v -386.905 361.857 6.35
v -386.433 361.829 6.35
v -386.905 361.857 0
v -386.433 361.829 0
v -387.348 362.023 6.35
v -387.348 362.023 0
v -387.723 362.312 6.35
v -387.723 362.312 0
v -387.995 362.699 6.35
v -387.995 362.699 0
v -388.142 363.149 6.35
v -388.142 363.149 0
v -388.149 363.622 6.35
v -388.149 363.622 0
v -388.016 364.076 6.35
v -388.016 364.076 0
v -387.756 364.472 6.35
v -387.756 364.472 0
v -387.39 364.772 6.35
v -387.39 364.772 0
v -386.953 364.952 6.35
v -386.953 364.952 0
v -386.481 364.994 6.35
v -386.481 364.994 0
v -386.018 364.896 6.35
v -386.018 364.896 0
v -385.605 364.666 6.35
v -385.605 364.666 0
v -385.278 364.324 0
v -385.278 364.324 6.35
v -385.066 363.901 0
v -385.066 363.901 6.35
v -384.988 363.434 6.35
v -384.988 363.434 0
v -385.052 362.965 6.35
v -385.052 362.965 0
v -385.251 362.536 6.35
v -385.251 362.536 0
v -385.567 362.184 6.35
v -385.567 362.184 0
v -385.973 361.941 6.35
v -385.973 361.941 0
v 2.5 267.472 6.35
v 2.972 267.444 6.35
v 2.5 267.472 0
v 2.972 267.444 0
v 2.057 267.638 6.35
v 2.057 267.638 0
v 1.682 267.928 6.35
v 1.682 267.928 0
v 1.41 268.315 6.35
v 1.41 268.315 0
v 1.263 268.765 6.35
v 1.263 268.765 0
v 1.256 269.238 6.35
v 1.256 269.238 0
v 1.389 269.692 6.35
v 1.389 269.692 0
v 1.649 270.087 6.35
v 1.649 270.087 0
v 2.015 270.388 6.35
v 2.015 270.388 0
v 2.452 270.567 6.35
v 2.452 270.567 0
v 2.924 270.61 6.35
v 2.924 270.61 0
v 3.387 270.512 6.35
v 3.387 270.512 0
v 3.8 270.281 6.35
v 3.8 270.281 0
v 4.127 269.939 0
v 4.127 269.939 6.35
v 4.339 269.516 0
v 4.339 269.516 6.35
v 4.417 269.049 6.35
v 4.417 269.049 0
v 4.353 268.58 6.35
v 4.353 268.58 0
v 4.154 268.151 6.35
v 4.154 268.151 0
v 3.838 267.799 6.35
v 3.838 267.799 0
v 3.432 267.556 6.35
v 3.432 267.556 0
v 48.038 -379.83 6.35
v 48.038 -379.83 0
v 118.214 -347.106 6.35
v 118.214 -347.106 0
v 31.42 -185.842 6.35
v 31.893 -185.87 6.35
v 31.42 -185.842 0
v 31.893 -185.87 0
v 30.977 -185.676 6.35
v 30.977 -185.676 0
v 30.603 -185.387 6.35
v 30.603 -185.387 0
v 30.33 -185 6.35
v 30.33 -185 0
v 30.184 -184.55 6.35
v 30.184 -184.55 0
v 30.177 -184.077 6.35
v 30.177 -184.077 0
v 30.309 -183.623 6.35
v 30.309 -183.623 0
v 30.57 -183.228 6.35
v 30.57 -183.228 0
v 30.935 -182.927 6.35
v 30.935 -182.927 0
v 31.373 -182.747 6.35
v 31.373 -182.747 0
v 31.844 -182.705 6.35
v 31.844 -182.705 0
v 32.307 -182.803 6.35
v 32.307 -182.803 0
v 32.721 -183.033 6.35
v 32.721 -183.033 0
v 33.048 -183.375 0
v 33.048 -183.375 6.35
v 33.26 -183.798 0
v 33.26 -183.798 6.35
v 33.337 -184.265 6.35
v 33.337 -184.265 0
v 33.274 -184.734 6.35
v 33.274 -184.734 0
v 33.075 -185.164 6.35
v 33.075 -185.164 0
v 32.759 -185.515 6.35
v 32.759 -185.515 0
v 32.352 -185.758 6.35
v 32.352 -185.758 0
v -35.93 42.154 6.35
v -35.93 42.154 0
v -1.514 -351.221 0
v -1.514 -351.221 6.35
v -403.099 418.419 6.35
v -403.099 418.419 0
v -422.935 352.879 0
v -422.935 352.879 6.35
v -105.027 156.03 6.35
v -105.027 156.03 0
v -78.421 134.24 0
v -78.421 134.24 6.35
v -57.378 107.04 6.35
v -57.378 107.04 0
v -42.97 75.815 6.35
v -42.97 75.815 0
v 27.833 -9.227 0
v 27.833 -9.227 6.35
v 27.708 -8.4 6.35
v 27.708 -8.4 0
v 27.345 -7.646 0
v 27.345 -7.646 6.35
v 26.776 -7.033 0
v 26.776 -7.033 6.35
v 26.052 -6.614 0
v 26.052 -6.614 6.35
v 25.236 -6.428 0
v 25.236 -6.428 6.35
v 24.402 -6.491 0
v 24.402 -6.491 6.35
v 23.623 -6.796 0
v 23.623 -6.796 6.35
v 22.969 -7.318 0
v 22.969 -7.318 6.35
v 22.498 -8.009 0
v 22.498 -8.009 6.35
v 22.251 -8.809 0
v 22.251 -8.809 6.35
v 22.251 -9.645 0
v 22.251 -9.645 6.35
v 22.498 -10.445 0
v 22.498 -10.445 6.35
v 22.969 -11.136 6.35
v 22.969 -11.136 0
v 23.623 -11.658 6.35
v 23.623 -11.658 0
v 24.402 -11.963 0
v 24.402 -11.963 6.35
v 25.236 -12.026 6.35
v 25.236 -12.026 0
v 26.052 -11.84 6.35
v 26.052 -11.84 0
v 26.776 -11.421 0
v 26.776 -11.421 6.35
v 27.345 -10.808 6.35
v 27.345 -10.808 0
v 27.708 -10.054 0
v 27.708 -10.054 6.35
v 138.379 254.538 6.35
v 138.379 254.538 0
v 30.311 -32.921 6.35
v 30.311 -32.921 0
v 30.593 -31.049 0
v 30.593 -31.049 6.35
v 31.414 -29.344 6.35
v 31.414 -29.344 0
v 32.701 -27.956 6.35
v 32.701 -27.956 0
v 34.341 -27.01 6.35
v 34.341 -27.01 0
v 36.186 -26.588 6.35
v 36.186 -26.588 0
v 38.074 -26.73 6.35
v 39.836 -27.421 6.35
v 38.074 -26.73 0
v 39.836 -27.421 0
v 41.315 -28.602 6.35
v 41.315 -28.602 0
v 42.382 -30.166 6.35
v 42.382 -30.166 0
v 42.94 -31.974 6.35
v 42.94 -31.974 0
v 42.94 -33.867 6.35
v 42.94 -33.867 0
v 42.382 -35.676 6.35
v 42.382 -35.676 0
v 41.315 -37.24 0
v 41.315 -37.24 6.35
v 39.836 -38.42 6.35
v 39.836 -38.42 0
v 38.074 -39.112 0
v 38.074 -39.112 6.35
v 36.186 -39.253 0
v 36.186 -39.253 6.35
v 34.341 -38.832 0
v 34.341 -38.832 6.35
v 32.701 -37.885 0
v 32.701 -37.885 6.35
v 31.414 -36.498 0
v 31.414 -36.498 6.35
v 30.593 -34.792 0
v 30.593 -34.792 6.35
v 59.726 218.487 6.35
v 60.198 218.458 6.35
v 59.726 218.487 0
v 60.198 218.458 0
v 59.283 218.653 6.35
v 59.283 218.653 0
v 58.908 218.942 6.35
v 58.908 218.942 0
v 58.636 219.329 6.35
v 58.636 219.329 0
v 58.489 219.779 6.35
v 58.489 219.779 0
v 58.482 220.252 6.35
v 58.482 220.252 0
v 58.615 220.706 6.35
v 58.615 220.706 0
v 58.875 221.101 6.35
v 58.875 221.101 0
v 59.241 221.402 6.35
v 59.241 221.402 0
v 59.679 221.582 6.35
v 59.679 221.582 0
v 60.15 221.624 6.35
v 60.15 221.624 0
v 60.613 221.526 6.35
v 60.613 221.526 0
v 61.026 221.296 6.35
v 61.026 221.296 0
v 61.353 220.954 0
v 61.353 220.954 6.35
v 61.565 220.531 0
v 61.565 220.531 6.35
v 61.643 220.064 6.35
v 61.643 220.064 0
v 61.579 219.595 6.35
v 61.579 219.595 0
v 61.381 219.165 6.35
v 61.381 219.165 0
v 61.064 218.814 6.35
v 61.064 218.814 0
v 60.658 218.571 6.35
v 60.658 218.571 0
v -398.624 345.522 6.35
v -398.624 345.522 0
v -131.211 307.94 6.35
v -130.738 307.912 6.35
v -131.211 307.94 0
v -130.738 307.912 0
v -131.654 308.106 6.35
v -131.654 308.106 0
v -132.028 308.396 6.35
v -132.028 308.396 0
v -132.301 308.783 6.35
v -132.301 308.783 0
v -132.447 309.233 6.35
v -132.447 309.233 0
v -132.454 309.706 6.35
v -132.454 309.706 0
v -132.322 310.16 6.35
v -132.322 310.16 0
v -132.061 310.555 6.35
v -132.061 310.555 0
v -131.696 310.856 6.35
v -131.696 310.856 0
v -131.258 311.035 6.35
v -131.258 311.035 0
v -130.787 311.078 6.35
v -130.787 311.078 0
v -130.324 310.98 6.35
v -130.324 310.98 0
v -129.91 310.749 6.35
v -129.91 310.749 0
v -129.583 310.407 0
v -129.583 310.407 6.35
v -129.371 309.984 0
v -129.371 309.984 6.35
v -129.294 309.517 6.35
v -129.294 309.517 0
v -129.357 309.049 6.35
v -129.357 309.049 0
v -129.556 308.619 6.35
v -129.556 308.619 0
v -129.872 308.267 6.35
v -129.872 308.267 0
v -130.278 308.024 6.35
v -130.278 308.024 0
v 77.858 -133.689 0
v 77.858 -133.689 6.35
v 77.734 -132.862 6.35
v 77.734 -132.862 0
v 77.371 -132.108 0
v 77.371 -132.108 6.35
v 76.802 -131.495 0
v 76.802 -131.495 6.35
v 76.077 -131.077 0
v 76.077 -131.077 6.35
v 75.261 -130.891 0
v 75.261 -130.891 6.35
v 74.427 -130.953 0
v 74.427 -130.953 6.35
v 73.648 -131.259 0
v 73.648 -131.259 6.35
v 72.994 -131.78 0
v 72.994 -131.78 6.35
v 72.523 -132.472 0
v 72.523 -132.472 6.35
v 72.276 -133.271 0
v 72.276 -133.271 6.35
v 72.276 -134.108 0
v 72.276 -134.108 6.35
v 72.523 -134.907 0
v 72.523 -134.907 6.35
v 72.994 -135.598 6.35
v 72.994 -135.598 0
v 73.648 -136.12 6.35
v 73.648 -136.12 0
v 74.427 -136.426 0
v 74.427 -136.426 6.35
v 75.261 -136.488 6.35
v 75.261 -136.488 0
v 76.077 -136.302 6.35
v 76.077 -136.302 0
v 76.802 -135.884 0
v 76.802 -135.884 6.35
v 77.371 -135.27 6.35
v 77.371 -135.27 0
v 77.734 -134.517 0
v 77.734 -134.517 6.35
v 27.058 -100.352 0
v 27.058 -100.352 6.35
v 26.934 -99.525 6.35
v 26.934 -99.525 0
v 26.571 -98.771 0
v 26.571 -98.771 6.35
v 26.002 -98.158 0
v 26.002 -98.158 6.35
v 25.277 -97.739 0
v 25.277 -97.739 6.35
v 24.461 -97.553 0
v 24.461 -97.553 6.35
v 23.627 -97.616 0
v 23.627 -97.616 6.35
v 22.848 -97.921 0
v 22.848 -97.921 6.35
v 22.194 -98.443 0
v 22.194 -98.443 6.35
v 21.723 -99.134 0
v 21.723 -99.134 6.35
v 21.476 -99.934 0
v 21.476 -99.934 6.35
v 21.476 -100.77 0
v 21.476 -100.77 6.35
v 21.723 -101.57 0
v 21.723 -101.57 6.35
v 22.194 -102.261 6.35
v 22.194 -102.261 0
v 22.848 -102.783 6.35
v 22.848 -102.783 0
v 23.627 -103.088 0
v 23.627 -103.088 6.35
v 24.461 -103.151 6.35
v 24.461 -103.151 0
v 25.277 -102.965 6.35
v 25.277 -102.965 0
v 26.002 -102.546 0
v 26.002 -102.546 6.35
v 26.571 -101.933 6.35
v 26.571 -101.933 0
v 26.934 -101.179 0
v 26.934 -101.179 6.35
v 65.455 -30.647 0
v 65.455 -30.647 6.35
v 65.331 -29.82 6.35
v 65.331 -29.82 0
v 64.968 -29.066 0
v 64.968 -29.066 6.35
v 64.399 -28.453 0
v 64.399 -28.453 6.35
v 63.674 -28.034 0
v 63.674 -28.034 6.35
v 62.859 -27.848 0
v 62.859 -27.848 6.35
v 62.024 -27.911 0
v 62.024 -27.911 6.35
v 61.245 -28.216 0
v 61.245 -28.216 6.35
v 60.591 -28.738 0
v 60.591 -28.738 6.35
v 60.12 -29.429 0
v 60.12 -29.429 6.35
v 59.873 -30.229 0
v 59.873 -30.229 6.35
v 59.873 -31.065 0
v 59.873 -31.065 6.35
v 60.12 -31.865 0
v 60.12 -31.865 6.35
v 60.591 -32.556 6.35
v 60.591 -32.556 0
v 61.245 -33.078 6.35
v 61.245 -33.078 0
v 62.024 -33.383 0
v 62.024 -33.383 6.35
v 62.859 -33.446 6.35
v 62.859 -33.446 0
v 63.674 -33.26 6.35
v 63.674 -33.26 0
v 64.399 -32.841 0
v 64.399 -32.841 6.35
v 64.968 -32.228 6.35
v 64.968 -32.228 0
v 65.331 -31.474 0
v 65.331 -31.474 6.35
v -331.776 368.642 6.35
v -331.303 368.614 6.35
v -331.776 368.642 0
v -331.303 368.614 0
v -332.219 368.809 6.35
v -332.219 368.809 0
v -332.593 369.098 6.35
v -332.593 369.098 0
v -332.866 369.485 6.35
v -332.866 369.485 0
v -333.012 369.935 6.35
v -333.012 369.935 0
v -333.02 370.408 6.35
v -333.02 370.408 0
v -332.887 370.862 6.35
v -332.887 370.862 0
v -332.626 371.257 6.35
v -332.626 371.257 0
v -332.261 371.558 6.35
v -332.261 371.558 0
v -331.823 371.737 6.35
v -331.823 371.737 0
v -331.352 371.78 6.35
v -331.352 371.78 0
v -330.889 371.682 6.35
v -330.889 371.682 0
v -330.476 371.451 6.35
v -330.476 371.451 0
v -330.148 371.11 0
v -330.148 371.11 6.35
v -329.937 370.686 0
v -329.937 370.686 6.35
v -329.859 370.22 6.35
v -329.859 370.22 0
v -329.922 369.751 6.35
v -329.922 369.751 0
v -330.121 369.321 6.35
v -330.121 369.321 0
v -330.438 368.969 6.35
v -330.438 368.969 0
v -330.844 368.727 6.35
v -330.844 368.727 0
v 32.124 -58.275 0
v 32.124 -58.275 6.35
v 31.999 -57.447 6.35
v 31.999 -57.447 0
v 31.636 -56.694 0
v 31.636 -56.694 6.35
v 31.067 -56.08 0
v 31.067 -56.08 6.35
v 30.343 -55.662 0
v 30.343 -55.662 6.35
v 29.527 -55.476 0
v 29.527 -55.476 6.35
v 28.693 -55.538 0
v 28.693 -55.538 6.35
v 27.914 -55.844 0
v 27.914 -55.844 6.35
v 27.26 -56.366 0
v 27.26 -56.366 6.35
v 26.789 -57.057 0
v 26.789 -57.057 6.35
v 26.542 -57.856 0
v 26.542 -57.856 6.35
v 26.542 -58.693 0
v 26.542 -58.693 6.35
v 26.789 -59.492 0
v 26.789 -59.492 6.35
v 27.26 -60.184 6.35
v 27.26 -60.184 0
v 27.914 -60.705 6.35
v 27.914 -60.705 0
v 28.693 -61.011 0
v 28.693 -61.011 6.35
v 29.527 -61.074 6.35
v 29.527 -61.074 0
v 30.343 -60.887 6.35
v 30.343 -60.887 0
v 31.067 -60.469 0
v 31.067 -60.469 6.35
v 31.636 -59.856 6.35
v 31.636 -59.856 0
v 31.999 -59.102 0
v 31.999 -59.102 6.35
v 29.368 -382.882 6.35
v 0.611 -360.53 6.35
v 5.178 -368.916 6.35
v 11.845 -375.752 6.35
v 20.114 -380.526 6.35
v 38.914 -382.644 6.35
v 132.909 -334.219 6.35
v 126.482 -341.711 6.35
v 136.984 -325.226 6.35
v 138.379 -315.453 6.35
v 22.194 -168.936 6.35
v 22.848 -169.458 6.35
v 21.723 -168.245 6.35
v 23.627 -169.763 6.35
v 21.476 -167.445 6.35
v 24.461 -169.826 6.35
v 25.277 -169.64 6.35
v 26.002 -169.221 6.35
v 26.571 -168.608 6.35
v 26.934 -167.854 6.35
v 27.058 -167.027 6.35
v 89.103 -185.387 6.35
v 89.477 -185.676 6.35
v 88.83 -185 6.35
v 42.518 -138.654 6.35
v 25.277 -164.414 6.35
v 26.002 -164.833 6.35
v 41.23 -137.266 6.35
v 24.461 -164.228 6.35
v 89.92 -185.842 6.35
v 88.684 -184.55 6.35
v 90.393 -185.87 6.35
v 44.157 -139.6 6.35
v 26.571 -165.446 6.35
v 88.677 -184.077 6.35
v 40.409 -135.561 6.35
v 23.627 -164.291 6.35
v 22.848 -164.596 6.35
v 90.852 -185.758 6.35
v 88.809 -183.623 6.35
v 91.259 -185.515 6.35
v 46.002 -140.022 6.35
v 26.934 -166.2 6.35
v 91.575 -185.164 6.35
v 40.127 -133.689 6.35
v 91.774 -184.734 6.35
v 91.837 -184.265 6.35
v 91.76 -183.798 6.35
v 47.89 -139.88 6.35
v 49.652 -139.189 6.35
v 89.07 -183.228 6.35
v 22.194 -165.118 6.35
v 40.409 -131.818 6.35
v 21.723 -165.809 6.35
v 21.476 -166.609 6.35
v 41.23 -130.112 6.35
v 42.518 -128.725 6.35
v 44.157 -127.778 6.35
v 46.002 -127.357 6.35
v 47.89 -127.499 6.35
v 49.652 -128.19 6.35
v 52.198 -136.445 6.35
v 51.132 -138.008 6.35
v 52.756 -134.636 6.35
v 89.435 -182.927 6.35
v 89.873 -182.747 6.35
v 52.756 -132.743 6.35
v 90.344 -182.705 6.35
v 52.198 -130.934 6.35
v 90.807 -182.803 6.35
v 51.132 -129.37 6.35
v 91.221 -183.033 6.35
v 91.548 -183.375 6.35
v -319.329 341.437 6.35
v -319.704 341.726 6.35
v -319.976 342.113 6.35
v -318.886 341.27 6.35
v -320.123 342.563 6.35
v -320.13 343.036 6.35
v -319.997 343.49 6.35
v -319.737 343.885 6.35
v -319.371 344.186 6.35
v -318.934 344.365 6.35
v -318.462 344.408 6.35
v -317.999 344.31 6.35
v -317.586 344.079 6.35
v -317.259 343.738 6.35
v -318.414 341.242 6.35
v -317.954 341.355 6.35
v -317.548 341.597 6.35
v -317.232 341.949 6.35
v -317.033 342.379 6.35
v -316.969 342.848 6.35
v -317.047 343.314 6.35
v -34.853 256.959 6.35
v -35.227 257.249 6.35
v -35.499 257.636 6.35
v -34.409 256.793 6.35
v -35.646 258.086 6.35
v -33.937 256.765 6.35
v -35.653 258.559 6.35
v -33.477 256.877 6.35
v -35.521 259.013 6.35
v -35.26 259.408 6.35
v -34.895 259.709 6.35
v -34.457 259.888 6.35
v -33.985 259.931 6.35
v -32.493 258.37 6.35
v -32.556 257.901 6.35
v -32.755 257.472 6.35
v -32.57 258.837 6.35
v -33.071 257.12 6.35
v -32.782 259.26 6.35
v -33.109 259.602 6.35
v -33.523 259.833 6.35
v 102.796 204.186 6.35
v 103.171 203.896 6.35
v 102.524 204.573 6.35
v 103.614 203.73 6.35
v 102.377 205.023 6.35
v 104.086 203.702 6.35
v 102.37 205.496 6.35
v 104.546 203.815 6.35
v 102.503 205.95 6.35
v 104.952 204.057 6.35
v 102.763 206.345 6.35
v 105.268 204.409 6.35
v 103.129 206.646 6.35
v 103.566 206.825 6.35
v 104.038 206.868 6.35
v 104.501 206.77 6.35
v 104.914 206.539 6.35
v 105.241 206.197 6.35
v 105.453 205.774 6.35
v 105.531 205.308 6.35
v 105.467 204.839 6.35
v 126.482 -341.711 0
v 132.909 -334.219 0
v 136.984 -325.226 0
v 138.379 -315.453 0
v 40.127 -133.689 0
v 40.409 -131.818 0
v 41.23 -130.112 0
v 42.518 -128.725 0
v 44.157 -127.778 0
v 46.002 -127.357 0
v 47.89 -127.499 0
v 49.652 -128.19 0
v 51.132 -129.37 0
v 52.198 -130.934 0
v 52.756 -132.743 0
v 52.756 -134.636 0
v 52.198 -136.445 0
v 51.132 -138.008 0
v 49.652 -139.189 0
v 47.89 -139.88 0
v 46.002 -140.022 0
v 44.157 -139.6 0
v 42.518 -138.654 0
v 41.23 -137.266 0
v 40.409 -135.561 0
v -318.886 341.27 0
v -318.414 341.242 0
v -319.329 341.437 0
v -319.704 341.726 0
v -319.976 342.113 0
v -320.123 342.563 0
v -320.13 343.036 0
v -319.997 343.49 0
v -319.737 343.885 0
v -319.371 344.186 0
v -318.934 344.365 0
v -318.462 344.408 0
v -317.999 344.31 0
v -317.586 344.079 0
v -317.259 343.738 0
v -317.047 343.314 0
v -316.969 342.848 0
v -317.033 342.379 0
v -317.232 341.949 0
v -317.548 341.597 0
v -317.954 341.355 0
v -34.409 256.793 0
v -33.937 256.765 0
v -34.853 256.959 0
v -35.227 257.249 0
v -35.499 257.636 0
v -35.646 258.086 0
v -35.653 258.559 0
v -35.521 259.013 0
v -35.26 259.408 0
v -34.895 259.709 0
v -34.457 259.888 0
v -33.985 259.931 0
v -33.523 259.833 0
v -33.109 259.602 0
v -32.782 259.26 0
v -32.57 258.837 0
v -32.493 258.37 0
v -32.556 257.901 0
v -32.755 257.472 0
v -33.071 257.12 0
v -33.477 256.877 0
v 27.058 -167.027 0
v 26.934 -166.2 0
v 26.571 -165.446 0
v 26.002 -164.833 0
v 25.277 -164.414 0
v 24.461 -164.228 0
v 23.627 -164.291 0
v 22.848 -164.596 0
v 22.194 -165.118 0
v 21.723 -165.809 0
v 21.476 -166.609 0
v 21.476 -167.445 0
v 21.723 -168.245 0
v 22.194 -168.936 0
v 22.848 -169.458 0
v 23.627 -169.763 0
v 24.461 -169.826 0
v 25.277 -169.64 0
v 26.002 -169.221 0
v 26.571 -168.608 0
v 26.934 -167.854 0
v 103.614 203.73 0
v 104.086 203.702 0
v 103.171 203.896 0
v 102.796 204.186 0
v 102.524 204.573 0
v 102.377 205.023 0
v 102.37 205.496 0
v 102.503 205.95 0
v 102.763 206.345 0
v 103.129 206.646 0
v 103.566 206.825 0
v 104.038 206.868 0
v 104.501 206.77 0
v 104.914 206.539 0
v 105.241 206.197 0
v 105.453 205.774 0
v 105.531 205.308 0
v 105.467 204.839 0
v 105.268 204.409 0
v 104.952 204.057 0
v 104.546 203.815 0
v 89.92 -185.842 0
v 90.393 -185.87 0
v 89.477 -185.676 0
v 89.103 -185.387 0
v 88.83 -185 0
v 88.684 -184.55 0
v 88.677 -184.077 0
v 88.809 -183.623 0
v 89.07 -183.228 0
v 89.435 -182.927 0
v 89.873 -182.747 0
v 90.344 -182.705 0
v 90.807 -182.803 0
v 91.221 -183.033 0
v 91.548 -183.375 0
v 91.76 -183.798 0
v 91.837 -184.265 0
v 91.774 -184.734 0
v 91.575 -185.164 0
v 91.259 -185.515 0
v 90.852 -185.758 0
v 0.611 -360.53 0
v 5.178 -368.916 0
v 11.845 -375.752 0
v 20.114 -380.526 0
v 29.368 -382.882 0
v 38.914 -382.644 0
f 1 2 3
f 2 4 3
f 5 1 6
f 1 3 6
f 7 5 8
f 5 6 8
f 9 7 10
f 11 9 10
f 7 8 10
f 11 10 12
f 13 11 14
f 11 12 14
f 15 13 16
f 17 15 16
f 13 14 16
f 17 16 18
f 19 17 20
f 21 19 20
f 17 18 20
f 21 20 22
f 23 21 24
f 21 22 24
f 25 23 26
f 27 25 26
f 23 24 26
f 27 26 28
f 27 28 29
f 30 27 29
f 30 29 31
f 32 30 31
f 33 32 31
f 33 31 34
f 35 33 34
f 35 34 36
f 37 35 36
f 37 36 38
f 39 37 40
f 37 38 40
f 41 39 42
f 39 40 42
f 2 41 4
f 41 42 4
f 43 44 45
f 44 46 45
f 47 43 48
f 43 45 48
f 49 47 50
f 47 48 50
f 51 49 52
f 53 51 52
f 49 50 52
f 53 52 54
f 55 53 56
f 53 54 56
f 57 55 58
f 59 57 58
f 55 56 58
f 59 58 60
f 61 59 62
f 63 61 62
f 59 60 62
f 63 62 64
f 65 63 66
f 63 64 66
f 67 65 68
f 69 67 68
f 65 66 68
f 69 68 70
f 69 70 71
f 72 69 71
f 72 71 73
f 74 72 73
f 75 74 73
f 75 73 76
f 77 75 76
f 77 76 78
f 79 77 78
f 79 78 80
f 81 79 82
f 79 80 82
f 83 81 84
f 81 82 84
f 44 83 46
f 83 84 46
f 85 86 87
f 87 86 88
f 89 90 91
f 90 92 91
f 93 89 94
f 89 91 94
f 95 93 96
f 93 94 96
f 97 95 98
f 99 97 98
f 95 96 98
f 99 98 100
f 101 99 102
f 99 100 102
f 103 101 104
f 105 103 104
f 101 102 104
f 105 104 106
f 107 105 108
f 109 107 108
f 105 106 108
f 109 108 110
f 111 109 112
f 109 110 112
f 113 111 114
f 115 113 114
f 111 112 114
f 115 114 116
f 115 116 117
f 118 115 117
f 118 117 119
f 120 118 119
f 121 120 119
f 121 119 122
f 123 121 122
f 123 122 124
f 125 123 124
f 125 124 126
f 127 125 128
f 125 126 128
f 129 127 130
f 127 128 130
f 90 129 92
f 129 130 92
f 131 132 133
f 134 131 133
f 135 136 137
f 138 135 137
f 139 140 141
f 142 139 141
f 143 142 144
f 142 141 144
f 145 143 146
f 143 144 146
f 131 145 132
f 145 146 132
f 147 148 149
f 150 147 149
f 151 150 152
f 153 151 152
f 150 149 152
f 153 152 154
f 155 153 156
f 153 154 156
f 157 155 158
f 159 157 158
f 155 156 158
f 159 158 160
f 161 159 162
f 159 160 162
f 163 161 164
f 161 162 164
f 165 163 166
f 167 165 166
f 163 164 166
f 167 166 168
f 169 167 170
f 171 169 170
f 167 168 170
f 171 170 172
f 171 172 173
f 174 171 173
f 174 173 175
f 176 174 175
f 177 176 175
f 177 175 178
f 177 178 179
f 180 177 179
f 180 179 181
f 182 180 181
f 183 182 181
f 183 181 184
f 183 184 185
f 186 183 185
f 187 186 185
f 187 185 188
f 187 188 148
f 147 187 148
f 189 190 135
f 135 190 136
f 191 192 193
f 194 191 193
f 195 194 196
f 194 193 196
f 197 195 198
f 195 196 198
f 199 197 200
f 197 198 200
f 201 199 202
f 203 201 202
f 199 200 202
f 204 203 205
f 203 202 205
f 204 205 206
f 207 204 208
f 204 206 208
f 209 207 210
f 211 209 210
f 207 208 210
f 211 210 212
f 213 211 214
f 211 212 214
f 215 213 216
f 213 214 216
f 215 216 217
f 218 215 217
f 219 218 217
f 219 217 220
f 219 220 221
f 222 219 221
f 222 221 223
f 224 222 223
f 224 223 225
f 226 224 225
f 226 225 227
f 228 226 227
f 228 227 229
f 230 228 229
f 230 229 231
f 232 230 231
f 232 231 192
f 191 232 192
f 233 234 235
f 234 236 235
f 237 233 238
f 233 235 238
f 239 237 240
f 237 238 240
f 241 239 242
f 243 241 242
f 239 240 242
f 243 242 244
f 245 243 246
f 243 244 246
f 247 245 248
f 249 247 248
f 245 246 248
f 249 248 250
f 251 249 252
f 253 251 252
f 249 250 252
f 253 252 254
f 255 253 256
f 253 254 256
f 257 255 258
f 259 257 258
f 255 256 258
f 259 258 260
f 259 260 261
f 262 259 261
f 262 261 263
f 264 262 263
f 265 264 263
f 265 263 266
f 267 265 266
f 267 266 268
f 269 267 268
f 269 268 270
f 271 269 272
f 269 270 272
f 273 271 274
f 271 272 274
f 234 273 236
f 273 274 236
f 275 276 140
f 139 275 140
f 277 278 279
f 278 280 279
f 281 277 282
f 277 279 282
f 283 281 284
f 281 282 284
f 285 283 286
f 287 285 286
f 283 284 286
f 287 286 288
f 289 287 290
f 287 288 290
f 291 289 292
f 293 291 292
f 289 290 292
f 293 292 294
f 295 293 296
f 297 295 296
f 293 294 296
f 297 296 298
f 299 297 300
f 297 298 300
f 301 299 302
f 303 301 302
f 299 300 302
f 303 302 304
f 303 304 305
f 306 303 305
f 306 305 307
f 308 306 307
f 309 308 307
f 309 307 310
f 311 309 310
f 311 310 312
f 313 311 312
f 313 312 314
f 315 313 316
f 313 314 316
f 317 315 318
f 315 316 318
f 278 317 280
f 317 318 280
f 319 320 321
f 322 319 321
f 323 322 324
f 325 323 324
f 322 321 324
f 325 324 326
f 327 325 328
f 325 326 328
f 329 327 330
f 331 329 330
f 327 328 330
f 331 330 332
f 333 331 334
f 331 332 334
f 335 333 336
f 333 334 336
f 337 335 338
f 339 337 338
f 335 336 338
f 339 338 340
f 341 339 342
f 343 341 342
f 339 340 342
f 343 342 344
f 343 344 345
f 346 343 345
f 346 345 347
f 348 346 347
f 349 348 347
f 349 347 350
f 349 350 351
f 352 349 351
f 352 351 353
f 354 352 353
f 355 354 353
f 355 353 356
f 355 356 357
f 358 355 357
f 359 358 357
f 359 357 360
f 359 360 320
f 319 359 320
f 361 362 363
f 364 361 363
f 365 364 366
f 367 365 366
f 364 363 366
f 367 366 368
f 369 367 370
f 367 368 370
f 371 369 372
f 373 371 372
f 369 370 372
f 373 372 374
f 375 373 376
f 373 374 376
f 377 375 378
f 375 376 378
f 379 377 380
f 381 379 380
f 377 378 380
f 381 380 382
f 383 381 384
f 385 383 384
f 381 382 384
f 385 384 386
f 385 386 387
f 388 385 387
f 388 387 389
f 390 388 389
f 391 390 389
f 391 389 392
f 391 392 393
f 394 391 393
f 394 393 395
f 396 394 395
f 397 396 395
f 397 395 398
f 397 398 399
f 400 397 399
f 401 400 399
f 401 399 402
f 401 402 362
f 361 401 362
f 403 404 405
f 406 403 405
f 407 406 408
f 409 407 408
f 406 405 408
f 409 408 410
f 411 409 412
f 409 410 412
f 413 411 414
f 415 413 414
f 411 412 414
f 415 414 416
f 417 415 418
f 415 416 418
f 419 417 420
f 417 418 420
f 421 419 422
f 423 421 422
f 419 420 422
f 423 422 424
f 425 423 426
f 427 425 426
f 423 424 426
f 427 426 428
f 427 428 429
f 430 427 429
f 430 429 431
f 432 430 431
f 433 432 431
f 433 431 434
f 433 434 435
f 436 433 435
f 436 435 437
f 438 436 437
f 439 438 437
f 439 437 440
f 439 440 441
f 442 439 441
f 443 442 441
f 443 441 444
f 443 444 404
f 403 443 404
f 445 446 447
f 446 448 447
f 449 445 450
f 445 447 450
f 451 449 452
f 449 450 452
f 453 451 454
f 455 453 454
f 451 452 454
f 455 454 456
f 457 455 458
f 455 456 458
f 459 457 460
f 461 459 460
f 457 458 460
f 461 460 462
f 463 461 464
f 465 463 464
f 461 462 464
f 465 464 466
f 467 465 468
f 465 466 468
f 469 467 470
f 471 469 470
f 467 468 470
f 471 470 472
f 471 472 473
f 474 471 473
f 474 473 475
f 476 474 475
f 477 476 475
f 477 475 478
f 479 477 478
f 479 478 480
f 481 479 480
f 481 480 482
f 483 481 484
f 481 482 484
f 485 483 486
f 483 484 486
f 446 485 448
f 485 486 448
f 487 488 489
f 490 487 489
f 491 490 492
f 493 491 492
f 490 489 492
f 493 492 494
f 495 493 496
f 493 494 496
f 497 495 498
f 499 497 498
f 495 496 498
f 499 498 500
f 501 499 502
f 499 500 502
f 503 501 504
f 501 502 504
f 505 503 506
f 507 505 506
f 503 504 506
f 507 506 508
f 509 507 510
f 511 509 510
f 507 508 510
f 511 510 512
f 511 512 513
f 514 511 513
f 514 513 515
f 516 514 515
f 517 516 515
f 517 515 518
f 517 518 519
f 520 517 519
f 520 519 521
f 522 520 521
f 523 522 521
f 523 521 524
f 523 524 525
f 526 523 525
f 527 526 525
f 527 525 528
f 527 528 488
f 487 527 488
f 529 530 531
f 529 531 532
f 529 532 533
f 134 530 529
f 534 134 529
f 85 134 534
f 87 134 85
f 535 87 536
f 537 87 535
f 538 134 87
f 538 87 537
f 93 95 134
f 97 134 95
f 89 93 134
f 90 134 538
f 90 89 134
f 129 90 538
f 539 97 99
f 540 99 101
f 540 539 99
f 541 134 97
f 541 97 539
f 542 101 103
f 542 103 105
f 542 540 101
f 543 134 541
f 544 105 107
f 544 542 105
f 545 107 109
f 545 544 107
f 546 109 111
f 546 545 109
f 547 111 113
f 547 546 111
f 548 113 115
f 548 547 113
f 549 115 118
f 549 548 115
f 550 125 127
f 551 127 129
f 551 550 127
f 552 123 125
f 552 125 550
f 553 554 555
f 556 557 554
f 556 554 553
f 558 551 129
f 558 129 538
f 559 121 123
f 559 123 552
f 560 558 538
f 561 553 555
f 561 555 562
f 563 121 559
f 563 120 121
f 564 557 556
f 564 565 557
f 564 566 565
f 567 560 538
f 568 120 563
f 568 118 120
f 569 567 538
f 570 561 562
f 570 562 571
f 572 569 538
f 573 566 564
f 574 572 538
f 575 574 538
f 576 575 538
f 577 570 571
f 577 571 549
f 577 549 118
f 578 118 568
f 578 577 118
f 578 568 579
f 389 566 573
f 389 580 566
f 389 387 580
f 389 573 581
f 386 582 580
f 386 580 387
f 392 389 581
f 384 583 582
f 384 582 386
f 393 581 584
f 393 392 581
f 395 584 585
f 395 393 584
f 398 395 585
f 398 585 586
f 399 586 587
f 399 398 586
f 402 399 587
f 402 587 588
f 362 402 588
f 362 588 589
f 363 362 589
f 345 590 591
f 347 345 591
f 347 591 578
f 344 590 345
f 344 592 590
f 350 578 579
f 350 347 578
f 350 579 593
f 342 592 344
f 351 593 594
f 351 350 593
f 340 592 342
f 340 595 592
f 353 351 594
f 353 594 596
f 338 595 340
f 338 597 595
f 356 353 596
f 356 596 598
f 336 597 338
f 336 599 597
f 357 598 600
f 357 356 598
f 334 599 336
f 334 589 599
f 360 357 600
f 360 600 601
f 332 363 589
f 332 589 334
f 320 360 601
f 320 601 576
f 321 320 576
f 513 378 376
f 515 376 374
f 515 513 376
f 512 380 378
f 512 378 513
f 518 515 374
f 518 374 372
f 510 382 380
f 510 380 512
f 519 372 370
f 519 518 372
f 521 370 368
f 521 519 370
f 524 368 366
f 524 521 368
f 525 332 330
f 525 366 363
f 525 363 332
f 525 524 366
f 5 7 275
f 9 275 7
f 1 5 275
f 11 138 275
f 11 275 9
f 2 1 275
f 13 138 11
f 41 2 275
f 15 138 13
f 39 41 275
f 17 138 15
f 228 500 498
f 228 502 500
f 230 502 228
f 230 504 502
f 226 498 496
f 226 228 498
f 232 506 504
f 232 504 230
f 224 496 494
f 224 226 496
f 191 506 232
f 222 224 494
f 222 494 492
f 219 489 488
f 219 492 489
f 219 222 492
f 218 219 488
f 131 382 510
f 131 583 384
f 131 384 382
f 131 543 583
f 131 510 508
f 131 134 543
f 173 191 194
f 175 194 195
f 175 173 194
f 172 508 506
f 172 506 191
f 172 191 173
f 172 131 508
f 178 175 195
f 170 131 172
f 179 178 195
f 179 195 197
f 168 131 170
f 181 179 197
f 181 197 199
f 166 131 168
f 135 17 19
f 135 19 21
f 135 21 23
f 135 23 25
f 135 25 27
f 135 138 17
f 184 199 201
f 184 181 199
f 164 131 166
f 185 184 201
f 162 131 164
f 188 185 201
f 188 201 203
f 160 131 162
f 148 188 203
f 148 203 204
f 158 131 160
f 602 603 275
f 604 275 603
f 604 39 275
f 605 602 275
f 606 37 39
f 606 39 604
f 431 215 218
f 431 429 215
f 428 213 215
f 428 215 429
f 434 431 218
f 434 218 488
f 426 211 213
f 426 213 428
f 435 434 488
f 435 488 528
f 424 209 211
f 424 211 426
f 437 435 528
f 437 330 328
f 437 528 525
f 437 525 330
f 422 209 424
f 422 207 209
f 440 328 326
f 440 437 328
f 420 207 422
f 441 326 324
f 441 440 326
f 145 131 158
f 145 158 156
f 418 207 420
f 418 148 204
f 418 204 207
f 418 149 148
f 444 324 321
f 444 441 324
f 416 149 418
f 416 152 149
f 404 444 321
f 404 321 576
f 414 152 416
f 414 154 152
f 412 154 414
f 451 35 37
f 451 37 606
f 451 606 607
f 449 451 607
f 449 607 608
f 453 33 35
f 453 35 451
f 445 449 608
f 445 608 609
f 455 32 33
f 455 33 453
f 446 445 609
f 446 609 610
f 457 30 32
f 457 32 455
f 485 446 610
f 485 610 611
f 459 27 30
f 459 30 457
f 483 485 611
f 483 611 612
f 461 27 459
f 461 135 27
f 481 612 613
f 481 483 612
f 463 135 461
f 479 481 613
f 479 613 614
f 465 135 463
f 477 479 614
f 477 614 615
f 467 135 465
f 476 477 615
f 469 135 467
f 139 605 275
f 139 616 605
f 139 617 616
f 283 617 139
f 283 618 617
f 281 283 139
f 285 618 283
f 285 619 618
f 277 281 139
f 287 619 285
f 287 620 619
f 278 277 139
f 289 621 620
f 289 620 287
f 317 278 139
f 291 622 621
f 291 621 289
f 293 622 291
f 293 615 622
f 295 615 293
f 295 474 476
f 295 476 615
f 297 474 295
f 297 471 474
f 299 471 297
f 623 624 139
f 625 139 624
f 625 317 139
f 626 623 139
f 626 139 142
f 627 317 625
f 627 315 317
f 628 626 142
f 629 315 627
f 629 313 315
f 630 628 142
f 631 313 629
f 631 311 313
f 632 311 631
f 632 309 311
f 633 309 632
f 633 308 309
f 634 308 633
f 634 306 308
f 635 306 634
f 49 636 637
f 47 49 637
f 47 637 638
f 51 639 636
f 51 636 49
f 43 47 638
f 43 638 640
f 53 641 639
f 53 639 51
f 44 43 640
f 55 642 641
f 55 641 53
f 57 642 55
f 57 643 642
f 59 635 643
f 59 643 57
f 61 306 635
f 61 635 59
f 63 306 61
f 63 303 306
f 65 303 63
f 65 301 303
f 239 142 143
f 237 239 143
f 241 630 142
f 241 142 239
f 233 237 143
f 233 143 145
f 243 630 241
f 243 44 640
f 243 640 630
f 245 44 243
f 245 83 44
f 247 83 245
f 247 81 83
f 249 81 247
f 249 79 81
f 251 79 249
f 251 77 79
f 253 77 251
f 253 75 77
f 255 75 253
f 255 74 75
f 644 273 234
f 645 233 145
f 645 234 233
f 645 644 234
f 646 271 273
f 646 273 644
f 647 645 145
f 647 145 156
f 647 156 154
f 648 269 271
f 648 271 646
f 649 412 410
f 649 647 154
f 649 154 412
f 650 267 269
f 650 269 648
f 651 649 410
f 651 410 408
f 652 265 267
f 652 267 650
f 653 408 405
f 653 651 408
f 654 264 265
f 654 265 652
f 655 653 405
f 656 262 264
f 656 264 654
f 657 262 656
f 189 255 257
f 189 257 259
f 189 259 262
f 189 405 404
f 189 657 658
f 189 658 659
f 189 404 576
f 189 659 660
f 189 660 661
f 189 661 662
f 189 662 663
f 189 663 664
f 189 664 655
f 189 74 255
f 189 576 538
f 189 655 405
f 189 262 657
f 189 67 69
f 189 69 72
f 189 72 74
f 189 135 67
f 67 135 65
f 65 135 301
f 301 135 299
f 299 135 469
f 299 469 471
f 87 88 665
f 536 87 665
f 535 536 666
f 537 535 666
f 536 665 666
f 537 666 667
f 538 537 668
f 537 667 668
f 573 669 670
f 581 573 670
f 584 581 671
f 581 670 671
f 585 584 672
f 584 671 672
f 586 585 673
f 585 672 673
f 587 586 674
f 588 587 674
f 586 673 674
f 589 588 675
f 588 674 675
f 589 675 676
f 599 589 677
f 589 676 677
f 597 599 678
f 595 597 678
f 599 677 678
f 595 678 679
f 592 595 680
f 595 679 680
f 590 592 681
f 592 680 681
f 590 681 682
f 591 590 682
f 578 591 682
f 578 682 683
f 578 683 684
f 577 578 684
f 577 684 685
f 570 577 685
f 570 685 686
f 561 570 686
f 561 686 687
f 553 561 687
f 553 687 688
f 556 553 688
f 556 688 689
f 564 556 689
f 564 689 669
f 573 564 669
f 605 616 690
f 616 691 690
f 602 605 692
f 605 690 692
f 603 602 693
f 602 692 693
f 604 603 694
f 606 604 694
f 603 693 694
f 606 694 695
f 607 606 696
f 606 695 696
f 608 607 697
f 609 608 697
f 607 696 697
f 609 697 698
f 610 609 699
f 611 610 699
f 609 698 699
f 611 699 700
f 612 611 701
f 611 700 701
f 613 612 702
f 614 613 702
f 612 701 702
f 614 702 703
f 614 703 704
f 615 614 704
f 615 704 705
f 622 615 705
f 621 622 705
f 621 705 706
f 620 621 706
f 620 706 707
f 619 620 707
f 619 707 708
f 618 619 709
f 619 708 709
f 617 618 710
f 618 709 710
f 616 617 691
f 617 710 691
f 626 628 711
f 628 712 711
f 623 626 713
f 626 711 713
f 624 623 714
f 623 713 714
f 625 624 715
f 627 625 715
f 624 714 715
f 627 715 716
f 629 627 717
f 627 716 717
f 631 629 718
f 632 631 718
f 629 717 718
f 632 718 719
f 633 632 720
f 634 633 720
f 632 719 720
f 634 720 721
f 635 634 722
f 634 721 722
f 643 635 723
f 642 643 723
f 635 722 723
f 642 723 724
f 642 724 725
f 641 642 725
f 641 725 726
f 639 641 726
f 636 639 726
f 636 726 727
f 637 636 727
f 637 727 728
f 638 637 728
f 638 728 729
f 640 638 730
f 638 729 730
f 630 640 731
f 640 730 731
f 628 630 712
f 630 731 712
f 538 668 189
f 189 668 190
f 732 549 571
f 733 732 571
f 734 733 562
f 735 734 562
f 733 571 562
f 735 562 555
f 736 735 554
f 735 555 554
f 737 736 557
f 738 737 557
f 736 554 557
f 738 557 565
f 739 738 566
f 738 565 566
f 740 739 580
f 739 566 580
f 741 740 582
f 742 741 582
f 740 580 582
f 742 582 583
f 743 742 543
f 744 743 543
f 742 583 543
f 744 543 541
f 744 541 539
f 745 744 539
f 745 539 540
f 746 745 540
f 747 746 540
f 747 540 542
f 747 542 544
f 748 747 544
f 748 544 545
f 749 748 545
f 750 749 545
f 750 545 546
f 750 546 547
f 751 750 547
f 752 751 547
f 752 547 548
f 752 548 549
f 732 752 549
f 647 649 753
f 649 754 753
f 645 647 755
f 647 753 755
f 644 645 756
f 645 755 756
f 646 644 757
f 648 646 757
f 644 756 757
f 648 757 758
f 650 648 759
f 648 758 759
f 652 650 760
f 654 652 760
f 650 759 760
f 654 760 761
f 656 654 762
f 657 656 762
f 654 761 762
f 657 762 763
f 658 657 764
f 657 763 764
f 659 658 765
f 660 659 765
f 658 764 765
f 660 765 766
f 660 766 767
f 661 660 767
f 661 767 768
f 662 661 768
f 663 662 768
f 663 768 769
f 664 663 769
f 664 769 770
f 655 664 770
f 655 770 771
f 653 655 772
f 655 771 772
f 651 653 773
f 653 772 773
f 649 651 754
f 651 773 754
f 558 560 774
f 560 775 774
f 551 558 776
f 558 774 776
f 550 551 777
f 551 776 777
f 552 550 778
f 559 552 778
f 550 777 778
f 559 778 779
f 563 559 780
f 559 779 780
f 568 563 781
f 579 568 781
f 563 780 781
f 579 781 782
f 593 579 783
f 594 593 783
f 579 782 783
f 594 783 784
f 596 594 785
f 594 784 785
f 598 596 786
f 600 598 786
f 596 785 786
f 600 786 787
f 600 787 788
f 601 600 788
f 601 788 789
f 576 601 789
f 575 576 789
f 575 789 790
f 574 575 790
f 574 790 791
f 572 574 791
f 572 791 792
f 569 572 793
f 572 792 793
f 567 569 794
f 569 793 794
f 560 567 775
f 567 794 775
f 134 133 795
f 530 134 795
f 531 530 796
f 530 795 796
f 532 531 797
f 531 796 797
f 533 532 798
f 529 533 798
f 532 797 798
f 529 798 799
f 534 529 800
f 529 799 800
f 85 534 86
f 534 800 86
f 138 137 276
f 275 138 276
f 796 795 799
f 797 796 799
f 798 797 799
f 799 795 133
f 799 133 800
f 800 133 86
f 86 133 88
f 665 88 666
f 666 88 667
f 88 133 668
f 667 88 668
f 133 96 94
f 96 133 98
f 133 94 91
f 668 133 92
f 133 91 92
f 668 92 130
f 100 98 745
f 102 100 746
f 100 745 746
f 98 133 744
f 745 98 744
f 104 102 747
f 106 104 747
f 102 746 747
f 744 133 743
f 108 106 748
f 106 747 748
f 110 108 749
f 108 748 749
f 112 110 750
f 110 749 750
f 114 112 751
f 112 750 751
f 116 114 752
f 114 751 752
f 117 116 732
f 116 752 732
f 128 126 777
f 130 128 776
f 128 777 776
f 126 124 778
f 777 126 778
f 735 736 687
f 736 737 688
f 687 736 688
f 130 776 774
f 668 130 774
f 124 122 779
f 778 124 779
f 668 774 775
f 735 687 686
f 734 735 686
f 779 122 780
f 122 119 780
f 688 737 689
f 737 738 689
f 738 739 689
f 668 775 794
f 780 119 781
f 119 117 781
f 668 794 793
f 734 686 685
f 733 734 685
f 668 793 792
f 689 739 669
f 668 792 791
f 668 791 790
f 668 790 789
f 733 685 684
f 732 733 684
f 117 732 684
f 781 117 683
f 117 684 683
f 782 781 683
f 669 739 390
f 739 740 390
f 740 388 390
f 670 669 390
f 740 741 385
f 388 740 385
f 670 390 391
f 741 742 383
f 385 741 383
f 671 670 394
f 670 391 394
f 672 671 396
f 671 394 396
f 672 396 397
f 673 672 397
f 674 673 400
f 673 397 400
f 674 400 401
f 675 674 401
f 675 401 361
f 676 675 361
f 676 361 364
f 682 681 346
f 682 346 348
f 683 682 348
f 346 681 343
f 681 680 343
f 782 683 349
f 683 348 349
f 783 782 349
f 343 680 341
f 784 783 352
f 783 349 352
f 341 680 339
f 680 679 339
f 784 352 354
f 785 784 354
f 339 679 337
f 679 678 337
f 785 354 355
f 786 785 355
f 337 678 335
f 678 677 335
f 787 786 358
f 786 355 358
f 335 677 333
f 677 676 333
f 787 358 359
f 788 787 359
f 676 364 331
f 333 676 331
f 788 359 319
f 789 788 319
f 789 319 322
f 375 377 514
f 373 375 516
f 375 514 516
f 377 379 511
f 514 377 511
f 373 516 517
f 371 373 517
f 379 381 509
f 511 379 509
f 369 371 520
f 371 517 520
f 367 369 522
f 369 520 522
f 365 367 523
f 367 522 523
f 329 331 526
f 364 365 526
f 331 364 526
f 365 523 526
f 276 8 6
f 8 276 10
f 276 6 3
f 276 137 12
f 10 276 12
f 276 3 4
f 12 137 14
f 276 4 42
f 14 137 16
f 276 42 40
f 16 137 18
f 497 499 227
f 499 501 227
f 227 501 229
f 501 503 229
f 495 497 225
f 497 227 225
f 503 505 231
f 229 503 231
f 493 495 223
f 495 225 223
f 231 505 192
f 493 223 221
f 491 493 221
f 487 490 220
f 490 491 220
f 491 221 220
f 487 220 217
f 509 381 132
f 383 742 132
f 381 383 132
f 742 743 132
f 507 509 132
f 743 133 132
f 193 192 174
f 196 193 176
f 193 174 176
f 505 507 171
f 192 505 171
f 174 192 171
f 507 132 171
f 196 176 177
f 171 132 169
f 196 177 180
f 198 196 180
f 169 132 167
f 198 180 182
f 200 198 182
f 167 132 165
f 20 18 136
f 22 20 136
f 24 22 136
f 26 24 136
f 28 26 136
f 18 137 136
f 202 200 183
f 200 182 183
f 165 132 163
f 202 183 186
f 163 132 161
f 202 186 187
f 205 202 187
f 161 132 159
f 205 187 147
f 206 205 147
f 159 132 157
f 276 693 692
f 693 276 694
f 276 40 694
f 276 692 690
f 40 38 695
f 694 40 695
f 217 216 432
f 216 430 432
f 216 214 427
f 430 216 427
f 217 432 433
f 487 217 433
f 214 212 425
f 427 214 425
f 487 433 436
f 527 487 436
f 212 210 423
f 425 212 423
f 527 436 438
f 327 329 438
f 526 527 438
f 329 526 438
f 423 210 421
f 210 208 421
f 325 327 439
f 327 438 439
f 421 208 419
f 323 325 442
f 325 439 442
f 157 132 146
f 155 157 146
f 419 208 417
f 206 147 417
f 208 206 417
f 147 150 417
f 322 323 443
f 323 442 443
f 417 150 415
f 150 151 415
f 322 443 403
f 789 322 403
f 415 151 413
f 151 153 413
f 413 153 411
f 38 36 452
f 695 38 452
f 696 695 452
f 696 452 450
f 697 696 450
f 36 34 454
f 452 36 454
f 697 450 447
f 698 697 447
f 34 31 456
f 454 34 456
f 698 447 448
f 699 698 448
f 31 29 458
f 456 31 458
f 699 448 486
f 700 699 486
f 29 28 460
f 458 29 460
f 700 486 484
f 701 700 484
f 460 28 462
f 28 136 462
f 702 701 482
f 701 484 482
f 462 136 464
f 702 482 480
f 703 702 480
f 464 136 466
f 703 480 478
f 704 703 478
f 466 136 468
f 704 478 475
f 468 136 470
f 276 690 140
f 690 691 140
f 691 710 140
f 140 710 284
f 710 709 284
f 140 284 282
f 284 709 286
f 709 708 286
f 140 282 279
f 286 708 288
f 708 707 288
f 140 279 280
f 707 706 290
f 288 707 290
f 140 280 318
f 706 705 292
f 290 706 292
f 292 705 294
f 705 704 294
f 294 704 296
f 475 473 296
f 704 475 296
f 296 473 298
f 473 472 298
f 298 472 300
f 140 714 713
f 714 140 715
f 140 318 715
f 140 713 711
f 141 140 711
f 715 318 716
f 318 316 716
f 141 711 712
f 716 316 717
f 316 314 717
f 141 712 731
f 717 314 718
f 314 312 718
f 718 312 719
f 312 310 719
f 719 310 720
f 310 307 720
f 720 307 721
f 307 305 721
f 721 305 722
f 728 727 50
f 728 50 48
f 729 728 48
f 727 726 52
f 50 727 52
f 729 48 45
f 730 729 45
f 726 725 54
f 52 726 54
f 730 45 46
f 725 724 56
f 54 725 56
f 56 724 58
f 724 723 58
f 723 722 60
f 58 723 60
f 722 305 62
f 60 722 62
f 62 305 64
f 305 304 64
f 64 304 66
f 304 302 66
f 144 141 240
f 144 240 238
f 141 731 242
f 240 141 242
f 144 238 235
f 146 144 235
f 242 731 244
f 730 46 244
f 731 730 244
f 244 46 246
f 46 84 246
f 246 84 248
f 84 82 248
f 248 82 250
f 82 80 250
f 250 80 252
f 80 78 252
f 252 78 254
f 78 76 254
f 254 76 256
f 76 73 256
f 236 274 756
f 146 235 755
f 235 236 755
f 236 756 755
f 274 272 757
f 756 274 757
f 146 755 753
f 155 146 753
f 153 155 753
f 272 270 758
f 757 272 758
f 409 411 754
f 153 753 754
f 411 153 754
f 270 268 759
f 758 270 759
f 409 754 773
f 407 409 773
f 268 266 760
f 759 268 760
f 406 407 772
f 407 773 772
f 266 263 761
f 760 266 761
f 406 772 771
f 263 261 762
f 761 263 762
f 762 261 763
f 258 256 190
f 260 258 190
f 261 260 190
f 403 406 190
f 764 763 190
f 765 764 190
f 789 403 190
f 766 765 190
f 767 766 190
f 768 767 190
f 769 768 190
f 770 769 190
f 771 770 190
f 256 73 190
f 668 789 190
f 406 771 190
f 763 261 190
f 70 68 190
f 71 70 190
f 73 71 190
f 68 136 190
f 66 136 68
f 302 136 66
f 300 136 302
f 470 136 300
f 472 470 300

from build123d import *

# Parameters (mm, degrees)
BOSS_EXTRUDE1_DEPTH    = 6.35
F_10_CLEARANCE_HOLE1_D = 5.6134
SKETCH2_R              = 6.35
CUT_EXTRUDE1_DEPTH     = 7.35
HOLE1_D                = 3.175
HOLE1_DEPTH            = 31.75
HOLE1_CSINK_D          = 10.16
HOLE1_CSINK_ANGLE      = 82
HOLE1_TIP              = 0.953866233


with BuildPart() as part:
    # Sketch1 → Boss-Extrude1 (new body)
    with BuildSketch(Plane.XY):
        with BuildLine():
            Line((-35.929687435, 42.153790719), (-1.51387348, -351.220762831))
            ThreePointArc((-1.51387348, -351.220762831), (15.815726351, -378.422785743), (48.038169143, -379.829647978))
            Line((48.038169143, -379.829647978), (118.213861049, -347.106185426))
            ThreePointArc((118.213861049, -347.106185426), (132.909364503, -334.218574785), (138.378918258, -315.453385964))
            Line((138.378918258, -315.453385964), (138.378918258, 254.538122714))
            Line((138.378918258, 254.538122714), (-403.099057101, 418.419278389))
            Line((-403.099057101, 418.419278389), (-422.935039487, 352.879420938))
            Line((-422.935039487, 352.879420938), (-398.624090476, 345.521584423))
            Line((-398.624090476, 345.521584423), (-105.026598758, 156.030008008))
            ThreePointArc((-105.026598758, 156.030008008), (-57.378429325, 107.040440177), (-35.929687435, 42.153790719))
        make_face()
    extrude(amount=BOSS_EXTRUDE1_DEPTH)

    # #10 Clearance Hole1 (through all)
    with Locations(Plane(origin=(0, 0, 0), x_dir=(-1, 0, 0), z_dir=(0, 0, -1))):
        with Locations((-24.251683892, -100.351877226), (-24.251683892, -167.026877226), (-75.051683892, -133.689377226), (-29.317369668, -58.274702428), (-25.026257572, -9.227066735), (-62.648775204, -30.647052627)):
            Hole(F_10_CLEARANCE_HOLE1_D / 2)

    # Sketch2 → Cut-Extrude1 (cut, through all)
    with BuildSketch(Plane(origin=(0, 0, 0), x_dir=(-1, 0, 0), z_dir=(0, 0, -1))):
        with Locations((-46.476683892, -133.689377226)):
            Circle(SKETCH2_R)
        with Locations((-36.66056812, -32.920726132)):
            Circle(SKETCH2_R)
    extrude(amount=-CUT_EXTRUDE1_DEPTH, mode=Mode.SUBTRACT)

    # Hole1
    with Locations(Plane(origin=(277.286738577, -215.287141225, 12.7), x_dir=(-0.089959629, 0.995945413, 0), z_dir=(0, 0, 1))):
        with Locations((637.870011036, 553.595098153), (52.960474705, 241.752641108), (47.697836423, 183.489834462), (434.459074831, 134.806234549), (453.103621196, 177.188747915), (499.723341091, 267.496267453), (636.071223534, 609.111420407), (609.449424187, 543.22015483), (559.371199386, 359.303721429), (507.038658285, 229.776136946)):
            CounterSinkHole(HOLE1_D / 2, HOLE1_CSINK_D / 2, depth=HOLE1_DEPTH, counter_sink_angle=HOLE1_CSINK_ANGLE)
            with Locations((0, 0, -(HOLE1_DEPTH + HOLE1_TIP / 2))):  # 118° drill point
                Cone(0, HOLE1_D / 2, HOLE1_TIP, mode=Mode.SUBTRACT)


solid = part.part
